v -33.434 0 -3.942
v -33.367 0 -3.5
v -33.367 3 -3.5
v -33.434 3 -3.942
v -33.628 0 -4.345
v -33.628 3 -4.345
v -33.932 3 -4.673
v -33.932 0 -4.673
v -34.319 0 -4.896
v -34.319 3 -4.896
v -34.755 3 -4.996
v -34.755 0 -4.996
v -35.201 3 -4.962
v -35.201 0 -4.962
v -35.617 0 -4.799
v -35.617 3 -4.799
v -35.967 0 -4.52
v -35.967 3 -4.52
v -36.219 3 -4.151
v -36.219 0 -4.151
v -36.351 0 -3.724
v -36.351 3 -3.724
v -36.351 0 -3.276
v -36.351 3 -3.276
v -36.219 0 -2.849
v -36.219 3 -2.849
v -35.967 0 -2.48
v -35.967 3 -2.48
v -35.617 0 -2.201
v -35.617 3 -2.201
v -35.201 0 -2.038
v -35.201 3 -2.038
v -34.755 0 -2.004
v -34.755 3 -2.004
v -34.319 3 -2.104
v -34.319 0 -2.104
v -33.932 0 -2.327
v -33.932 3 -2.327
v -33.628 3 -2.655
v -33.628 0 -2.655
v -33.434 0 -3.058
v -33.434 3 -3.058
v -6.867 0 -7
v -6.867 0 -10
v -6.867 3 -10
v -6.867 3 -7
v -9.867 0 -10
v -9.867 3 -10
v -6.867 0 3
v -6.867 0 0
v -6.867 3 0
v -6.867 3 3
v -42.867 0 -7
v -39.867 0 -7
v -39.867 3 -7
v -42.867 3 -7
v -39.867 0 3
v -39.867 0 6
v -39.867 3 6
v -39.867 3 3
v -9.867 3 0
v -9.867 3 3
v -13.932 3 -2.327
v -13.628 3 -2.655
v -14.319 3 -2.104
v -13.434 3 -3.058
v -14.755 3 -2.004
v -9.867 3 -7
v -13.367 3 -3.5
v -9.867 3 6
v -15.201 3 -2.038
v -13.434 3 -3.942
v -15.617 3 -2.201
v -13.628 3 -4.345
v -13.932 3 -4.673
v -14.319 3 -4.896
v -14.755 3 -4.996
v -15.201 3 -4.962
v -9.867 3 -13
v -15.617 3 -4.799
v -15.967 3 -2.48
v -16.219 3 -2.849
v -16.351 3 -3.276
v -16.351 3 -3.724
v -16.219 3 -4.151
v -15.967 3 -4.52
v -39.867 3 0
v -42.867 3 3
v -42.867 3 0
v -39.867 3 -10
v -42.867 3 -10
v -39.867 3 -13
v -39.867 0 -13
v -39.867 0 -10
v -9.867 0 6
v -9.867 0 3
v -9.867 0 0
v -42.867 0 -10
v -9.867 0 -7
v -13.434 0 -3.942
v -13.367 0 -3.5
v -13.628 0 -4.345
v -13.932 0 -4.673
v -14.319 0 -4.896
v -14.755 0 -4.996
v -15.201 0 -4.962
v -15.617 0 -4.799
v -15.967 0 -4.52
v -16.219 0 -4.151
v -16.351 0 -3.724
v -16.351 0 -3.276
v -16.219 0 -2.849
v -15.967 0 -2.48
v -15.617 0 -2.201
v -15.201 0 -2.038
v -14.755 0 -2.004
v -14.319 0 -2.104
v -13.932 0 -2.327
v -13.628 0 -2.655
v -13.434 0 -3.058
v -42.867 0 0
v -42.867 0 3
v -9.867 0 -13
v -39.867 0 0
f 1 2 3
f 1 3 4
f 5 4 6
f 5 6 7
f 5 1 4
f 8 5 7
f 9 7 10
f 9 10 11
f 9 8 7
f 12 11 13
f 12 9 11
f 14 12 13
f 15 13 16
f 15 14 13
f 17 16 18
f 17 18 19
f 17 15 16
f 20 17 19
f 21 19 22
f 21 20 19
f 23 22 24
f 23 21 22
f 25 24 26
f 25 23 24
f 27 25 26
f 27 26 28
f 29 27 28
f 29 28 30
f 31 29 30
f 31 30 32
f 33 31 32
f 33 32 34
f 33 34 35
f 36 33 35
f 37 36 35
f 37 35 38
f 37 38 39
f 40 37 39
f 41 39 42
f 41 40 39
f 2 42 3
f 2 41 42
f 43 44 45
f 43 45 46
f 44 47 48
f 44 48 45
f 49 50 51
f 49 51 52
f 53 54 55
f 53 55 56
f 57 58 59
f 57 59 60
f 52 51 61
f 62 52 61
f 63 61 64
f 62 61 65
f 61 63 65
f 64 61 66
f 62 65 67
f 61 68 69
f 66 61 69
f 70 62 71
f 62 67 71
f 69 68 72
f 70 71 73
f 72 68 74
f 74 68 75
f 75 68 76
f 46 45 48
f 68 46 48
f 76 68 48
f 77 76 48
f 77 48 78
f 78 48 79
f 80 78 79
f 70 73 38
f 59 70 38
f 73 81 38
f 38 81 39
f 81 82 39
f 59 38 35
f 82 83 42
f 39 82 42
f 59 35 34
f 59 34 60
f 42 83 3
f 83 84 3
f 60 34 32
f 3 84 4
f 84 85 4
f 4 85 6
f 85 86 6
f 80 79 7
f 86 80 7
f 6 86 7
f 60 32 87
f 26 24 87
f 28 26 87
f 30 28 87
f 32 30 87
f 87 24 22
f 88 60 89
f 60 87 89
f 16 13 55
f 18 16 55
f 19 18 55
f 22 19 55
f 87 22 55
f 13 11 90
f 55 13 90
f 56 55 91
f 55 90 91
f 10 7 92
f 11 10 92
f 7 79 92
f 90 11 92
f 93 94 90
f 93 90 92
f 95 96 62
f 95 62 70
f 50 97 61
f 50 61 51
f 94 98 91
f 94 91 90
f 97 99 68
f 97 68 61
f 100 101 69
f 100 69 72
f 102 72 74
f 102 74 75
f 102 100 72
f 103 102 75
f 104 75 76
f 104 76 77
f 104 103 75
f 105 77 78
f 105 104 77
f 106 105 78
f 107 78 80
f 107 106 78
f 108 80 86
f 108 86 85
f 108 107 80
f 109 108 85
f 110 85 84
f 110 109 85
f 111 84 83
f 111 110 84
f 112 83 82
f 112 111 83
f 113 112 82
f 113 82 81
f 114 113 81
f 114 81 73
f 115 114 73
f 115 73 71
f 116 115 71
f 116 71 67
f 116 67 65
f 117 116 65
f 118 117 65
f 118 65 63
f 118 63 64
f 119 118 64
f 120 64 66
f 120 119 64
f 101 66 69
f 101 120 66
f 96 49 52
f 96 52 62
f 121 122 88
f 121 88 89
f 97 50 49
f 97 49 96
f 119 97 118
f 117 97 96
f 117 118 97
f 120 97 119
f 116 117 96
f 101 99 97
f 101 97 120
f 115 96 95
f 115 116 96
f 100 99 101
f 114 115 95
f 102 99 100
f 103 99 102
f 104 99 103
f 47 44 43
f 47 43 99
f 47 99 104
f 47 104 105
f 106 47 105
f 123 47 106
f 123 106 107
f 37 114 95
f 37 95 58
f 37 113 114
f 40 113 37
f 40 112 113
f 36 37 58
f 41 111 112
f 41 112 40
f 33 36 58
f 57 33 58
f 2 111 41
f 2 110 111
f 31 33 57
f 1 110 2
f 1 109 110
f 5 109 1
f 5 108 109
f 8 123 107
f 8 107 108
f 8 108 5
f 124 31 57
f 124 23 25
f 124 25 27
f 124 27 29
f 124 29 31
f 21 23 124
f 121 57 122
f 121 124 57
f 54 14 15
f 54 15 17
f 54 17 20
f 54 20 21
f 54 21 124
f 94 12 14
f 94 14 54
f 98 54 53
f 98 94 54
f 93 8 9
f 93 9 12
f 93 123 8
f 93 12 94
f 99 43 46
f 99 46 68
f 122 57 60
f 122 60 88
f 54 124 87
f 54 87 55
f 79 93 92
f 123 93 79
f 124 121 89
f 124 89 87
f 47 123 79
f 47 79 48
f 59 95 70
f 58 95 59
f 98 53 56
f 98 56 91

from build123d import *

# Parameters (mm, degrees)
SKETCH1_R           = 1.5
BOSS_EXTRUDE1_DEPTH = 3


with BuildPart() as part:
    # Sketch1 → Boss-Extrude1 (new body)
    with BuildSketch(Plane(origin=(0, 0, 0), x_dir=(1, 0, 0), z_dir=(0, 1, 0))):
        Polygon((-42.867412192, 7), (-42.867412192, 10), (-39.867412192, 10), (-39.867412192, 13), (-9.867412192, 13), (-9.867412192, 10), (-6.867412192, 10), (-6.867412192, 7), (-9.867412192, 7), (-9.867412192, 0), (-6.867412192, 0), (-6.867412192, -3), (-9.867412192, -3), (-9.867412192, -6), (-39.867412192, -6), (-39.867412192, -3), (-42.867412192, -3), (-42.867412192, 0), (-39.867412192, 0), (-39.867412192, 7), align=None)
        with Locations((-34.867412192, 3.5)):
            Circle(SKETCH1_R, mode=Mode.SUBTRACT)
        with Locations((-14.867412192, 3.5)):
            Circle(SKETCH1_R, mode=Mode.SUBTRACT)
    extrude(amount=BOSS_EXTRUDE1_DEPTH)


solid = part.part
